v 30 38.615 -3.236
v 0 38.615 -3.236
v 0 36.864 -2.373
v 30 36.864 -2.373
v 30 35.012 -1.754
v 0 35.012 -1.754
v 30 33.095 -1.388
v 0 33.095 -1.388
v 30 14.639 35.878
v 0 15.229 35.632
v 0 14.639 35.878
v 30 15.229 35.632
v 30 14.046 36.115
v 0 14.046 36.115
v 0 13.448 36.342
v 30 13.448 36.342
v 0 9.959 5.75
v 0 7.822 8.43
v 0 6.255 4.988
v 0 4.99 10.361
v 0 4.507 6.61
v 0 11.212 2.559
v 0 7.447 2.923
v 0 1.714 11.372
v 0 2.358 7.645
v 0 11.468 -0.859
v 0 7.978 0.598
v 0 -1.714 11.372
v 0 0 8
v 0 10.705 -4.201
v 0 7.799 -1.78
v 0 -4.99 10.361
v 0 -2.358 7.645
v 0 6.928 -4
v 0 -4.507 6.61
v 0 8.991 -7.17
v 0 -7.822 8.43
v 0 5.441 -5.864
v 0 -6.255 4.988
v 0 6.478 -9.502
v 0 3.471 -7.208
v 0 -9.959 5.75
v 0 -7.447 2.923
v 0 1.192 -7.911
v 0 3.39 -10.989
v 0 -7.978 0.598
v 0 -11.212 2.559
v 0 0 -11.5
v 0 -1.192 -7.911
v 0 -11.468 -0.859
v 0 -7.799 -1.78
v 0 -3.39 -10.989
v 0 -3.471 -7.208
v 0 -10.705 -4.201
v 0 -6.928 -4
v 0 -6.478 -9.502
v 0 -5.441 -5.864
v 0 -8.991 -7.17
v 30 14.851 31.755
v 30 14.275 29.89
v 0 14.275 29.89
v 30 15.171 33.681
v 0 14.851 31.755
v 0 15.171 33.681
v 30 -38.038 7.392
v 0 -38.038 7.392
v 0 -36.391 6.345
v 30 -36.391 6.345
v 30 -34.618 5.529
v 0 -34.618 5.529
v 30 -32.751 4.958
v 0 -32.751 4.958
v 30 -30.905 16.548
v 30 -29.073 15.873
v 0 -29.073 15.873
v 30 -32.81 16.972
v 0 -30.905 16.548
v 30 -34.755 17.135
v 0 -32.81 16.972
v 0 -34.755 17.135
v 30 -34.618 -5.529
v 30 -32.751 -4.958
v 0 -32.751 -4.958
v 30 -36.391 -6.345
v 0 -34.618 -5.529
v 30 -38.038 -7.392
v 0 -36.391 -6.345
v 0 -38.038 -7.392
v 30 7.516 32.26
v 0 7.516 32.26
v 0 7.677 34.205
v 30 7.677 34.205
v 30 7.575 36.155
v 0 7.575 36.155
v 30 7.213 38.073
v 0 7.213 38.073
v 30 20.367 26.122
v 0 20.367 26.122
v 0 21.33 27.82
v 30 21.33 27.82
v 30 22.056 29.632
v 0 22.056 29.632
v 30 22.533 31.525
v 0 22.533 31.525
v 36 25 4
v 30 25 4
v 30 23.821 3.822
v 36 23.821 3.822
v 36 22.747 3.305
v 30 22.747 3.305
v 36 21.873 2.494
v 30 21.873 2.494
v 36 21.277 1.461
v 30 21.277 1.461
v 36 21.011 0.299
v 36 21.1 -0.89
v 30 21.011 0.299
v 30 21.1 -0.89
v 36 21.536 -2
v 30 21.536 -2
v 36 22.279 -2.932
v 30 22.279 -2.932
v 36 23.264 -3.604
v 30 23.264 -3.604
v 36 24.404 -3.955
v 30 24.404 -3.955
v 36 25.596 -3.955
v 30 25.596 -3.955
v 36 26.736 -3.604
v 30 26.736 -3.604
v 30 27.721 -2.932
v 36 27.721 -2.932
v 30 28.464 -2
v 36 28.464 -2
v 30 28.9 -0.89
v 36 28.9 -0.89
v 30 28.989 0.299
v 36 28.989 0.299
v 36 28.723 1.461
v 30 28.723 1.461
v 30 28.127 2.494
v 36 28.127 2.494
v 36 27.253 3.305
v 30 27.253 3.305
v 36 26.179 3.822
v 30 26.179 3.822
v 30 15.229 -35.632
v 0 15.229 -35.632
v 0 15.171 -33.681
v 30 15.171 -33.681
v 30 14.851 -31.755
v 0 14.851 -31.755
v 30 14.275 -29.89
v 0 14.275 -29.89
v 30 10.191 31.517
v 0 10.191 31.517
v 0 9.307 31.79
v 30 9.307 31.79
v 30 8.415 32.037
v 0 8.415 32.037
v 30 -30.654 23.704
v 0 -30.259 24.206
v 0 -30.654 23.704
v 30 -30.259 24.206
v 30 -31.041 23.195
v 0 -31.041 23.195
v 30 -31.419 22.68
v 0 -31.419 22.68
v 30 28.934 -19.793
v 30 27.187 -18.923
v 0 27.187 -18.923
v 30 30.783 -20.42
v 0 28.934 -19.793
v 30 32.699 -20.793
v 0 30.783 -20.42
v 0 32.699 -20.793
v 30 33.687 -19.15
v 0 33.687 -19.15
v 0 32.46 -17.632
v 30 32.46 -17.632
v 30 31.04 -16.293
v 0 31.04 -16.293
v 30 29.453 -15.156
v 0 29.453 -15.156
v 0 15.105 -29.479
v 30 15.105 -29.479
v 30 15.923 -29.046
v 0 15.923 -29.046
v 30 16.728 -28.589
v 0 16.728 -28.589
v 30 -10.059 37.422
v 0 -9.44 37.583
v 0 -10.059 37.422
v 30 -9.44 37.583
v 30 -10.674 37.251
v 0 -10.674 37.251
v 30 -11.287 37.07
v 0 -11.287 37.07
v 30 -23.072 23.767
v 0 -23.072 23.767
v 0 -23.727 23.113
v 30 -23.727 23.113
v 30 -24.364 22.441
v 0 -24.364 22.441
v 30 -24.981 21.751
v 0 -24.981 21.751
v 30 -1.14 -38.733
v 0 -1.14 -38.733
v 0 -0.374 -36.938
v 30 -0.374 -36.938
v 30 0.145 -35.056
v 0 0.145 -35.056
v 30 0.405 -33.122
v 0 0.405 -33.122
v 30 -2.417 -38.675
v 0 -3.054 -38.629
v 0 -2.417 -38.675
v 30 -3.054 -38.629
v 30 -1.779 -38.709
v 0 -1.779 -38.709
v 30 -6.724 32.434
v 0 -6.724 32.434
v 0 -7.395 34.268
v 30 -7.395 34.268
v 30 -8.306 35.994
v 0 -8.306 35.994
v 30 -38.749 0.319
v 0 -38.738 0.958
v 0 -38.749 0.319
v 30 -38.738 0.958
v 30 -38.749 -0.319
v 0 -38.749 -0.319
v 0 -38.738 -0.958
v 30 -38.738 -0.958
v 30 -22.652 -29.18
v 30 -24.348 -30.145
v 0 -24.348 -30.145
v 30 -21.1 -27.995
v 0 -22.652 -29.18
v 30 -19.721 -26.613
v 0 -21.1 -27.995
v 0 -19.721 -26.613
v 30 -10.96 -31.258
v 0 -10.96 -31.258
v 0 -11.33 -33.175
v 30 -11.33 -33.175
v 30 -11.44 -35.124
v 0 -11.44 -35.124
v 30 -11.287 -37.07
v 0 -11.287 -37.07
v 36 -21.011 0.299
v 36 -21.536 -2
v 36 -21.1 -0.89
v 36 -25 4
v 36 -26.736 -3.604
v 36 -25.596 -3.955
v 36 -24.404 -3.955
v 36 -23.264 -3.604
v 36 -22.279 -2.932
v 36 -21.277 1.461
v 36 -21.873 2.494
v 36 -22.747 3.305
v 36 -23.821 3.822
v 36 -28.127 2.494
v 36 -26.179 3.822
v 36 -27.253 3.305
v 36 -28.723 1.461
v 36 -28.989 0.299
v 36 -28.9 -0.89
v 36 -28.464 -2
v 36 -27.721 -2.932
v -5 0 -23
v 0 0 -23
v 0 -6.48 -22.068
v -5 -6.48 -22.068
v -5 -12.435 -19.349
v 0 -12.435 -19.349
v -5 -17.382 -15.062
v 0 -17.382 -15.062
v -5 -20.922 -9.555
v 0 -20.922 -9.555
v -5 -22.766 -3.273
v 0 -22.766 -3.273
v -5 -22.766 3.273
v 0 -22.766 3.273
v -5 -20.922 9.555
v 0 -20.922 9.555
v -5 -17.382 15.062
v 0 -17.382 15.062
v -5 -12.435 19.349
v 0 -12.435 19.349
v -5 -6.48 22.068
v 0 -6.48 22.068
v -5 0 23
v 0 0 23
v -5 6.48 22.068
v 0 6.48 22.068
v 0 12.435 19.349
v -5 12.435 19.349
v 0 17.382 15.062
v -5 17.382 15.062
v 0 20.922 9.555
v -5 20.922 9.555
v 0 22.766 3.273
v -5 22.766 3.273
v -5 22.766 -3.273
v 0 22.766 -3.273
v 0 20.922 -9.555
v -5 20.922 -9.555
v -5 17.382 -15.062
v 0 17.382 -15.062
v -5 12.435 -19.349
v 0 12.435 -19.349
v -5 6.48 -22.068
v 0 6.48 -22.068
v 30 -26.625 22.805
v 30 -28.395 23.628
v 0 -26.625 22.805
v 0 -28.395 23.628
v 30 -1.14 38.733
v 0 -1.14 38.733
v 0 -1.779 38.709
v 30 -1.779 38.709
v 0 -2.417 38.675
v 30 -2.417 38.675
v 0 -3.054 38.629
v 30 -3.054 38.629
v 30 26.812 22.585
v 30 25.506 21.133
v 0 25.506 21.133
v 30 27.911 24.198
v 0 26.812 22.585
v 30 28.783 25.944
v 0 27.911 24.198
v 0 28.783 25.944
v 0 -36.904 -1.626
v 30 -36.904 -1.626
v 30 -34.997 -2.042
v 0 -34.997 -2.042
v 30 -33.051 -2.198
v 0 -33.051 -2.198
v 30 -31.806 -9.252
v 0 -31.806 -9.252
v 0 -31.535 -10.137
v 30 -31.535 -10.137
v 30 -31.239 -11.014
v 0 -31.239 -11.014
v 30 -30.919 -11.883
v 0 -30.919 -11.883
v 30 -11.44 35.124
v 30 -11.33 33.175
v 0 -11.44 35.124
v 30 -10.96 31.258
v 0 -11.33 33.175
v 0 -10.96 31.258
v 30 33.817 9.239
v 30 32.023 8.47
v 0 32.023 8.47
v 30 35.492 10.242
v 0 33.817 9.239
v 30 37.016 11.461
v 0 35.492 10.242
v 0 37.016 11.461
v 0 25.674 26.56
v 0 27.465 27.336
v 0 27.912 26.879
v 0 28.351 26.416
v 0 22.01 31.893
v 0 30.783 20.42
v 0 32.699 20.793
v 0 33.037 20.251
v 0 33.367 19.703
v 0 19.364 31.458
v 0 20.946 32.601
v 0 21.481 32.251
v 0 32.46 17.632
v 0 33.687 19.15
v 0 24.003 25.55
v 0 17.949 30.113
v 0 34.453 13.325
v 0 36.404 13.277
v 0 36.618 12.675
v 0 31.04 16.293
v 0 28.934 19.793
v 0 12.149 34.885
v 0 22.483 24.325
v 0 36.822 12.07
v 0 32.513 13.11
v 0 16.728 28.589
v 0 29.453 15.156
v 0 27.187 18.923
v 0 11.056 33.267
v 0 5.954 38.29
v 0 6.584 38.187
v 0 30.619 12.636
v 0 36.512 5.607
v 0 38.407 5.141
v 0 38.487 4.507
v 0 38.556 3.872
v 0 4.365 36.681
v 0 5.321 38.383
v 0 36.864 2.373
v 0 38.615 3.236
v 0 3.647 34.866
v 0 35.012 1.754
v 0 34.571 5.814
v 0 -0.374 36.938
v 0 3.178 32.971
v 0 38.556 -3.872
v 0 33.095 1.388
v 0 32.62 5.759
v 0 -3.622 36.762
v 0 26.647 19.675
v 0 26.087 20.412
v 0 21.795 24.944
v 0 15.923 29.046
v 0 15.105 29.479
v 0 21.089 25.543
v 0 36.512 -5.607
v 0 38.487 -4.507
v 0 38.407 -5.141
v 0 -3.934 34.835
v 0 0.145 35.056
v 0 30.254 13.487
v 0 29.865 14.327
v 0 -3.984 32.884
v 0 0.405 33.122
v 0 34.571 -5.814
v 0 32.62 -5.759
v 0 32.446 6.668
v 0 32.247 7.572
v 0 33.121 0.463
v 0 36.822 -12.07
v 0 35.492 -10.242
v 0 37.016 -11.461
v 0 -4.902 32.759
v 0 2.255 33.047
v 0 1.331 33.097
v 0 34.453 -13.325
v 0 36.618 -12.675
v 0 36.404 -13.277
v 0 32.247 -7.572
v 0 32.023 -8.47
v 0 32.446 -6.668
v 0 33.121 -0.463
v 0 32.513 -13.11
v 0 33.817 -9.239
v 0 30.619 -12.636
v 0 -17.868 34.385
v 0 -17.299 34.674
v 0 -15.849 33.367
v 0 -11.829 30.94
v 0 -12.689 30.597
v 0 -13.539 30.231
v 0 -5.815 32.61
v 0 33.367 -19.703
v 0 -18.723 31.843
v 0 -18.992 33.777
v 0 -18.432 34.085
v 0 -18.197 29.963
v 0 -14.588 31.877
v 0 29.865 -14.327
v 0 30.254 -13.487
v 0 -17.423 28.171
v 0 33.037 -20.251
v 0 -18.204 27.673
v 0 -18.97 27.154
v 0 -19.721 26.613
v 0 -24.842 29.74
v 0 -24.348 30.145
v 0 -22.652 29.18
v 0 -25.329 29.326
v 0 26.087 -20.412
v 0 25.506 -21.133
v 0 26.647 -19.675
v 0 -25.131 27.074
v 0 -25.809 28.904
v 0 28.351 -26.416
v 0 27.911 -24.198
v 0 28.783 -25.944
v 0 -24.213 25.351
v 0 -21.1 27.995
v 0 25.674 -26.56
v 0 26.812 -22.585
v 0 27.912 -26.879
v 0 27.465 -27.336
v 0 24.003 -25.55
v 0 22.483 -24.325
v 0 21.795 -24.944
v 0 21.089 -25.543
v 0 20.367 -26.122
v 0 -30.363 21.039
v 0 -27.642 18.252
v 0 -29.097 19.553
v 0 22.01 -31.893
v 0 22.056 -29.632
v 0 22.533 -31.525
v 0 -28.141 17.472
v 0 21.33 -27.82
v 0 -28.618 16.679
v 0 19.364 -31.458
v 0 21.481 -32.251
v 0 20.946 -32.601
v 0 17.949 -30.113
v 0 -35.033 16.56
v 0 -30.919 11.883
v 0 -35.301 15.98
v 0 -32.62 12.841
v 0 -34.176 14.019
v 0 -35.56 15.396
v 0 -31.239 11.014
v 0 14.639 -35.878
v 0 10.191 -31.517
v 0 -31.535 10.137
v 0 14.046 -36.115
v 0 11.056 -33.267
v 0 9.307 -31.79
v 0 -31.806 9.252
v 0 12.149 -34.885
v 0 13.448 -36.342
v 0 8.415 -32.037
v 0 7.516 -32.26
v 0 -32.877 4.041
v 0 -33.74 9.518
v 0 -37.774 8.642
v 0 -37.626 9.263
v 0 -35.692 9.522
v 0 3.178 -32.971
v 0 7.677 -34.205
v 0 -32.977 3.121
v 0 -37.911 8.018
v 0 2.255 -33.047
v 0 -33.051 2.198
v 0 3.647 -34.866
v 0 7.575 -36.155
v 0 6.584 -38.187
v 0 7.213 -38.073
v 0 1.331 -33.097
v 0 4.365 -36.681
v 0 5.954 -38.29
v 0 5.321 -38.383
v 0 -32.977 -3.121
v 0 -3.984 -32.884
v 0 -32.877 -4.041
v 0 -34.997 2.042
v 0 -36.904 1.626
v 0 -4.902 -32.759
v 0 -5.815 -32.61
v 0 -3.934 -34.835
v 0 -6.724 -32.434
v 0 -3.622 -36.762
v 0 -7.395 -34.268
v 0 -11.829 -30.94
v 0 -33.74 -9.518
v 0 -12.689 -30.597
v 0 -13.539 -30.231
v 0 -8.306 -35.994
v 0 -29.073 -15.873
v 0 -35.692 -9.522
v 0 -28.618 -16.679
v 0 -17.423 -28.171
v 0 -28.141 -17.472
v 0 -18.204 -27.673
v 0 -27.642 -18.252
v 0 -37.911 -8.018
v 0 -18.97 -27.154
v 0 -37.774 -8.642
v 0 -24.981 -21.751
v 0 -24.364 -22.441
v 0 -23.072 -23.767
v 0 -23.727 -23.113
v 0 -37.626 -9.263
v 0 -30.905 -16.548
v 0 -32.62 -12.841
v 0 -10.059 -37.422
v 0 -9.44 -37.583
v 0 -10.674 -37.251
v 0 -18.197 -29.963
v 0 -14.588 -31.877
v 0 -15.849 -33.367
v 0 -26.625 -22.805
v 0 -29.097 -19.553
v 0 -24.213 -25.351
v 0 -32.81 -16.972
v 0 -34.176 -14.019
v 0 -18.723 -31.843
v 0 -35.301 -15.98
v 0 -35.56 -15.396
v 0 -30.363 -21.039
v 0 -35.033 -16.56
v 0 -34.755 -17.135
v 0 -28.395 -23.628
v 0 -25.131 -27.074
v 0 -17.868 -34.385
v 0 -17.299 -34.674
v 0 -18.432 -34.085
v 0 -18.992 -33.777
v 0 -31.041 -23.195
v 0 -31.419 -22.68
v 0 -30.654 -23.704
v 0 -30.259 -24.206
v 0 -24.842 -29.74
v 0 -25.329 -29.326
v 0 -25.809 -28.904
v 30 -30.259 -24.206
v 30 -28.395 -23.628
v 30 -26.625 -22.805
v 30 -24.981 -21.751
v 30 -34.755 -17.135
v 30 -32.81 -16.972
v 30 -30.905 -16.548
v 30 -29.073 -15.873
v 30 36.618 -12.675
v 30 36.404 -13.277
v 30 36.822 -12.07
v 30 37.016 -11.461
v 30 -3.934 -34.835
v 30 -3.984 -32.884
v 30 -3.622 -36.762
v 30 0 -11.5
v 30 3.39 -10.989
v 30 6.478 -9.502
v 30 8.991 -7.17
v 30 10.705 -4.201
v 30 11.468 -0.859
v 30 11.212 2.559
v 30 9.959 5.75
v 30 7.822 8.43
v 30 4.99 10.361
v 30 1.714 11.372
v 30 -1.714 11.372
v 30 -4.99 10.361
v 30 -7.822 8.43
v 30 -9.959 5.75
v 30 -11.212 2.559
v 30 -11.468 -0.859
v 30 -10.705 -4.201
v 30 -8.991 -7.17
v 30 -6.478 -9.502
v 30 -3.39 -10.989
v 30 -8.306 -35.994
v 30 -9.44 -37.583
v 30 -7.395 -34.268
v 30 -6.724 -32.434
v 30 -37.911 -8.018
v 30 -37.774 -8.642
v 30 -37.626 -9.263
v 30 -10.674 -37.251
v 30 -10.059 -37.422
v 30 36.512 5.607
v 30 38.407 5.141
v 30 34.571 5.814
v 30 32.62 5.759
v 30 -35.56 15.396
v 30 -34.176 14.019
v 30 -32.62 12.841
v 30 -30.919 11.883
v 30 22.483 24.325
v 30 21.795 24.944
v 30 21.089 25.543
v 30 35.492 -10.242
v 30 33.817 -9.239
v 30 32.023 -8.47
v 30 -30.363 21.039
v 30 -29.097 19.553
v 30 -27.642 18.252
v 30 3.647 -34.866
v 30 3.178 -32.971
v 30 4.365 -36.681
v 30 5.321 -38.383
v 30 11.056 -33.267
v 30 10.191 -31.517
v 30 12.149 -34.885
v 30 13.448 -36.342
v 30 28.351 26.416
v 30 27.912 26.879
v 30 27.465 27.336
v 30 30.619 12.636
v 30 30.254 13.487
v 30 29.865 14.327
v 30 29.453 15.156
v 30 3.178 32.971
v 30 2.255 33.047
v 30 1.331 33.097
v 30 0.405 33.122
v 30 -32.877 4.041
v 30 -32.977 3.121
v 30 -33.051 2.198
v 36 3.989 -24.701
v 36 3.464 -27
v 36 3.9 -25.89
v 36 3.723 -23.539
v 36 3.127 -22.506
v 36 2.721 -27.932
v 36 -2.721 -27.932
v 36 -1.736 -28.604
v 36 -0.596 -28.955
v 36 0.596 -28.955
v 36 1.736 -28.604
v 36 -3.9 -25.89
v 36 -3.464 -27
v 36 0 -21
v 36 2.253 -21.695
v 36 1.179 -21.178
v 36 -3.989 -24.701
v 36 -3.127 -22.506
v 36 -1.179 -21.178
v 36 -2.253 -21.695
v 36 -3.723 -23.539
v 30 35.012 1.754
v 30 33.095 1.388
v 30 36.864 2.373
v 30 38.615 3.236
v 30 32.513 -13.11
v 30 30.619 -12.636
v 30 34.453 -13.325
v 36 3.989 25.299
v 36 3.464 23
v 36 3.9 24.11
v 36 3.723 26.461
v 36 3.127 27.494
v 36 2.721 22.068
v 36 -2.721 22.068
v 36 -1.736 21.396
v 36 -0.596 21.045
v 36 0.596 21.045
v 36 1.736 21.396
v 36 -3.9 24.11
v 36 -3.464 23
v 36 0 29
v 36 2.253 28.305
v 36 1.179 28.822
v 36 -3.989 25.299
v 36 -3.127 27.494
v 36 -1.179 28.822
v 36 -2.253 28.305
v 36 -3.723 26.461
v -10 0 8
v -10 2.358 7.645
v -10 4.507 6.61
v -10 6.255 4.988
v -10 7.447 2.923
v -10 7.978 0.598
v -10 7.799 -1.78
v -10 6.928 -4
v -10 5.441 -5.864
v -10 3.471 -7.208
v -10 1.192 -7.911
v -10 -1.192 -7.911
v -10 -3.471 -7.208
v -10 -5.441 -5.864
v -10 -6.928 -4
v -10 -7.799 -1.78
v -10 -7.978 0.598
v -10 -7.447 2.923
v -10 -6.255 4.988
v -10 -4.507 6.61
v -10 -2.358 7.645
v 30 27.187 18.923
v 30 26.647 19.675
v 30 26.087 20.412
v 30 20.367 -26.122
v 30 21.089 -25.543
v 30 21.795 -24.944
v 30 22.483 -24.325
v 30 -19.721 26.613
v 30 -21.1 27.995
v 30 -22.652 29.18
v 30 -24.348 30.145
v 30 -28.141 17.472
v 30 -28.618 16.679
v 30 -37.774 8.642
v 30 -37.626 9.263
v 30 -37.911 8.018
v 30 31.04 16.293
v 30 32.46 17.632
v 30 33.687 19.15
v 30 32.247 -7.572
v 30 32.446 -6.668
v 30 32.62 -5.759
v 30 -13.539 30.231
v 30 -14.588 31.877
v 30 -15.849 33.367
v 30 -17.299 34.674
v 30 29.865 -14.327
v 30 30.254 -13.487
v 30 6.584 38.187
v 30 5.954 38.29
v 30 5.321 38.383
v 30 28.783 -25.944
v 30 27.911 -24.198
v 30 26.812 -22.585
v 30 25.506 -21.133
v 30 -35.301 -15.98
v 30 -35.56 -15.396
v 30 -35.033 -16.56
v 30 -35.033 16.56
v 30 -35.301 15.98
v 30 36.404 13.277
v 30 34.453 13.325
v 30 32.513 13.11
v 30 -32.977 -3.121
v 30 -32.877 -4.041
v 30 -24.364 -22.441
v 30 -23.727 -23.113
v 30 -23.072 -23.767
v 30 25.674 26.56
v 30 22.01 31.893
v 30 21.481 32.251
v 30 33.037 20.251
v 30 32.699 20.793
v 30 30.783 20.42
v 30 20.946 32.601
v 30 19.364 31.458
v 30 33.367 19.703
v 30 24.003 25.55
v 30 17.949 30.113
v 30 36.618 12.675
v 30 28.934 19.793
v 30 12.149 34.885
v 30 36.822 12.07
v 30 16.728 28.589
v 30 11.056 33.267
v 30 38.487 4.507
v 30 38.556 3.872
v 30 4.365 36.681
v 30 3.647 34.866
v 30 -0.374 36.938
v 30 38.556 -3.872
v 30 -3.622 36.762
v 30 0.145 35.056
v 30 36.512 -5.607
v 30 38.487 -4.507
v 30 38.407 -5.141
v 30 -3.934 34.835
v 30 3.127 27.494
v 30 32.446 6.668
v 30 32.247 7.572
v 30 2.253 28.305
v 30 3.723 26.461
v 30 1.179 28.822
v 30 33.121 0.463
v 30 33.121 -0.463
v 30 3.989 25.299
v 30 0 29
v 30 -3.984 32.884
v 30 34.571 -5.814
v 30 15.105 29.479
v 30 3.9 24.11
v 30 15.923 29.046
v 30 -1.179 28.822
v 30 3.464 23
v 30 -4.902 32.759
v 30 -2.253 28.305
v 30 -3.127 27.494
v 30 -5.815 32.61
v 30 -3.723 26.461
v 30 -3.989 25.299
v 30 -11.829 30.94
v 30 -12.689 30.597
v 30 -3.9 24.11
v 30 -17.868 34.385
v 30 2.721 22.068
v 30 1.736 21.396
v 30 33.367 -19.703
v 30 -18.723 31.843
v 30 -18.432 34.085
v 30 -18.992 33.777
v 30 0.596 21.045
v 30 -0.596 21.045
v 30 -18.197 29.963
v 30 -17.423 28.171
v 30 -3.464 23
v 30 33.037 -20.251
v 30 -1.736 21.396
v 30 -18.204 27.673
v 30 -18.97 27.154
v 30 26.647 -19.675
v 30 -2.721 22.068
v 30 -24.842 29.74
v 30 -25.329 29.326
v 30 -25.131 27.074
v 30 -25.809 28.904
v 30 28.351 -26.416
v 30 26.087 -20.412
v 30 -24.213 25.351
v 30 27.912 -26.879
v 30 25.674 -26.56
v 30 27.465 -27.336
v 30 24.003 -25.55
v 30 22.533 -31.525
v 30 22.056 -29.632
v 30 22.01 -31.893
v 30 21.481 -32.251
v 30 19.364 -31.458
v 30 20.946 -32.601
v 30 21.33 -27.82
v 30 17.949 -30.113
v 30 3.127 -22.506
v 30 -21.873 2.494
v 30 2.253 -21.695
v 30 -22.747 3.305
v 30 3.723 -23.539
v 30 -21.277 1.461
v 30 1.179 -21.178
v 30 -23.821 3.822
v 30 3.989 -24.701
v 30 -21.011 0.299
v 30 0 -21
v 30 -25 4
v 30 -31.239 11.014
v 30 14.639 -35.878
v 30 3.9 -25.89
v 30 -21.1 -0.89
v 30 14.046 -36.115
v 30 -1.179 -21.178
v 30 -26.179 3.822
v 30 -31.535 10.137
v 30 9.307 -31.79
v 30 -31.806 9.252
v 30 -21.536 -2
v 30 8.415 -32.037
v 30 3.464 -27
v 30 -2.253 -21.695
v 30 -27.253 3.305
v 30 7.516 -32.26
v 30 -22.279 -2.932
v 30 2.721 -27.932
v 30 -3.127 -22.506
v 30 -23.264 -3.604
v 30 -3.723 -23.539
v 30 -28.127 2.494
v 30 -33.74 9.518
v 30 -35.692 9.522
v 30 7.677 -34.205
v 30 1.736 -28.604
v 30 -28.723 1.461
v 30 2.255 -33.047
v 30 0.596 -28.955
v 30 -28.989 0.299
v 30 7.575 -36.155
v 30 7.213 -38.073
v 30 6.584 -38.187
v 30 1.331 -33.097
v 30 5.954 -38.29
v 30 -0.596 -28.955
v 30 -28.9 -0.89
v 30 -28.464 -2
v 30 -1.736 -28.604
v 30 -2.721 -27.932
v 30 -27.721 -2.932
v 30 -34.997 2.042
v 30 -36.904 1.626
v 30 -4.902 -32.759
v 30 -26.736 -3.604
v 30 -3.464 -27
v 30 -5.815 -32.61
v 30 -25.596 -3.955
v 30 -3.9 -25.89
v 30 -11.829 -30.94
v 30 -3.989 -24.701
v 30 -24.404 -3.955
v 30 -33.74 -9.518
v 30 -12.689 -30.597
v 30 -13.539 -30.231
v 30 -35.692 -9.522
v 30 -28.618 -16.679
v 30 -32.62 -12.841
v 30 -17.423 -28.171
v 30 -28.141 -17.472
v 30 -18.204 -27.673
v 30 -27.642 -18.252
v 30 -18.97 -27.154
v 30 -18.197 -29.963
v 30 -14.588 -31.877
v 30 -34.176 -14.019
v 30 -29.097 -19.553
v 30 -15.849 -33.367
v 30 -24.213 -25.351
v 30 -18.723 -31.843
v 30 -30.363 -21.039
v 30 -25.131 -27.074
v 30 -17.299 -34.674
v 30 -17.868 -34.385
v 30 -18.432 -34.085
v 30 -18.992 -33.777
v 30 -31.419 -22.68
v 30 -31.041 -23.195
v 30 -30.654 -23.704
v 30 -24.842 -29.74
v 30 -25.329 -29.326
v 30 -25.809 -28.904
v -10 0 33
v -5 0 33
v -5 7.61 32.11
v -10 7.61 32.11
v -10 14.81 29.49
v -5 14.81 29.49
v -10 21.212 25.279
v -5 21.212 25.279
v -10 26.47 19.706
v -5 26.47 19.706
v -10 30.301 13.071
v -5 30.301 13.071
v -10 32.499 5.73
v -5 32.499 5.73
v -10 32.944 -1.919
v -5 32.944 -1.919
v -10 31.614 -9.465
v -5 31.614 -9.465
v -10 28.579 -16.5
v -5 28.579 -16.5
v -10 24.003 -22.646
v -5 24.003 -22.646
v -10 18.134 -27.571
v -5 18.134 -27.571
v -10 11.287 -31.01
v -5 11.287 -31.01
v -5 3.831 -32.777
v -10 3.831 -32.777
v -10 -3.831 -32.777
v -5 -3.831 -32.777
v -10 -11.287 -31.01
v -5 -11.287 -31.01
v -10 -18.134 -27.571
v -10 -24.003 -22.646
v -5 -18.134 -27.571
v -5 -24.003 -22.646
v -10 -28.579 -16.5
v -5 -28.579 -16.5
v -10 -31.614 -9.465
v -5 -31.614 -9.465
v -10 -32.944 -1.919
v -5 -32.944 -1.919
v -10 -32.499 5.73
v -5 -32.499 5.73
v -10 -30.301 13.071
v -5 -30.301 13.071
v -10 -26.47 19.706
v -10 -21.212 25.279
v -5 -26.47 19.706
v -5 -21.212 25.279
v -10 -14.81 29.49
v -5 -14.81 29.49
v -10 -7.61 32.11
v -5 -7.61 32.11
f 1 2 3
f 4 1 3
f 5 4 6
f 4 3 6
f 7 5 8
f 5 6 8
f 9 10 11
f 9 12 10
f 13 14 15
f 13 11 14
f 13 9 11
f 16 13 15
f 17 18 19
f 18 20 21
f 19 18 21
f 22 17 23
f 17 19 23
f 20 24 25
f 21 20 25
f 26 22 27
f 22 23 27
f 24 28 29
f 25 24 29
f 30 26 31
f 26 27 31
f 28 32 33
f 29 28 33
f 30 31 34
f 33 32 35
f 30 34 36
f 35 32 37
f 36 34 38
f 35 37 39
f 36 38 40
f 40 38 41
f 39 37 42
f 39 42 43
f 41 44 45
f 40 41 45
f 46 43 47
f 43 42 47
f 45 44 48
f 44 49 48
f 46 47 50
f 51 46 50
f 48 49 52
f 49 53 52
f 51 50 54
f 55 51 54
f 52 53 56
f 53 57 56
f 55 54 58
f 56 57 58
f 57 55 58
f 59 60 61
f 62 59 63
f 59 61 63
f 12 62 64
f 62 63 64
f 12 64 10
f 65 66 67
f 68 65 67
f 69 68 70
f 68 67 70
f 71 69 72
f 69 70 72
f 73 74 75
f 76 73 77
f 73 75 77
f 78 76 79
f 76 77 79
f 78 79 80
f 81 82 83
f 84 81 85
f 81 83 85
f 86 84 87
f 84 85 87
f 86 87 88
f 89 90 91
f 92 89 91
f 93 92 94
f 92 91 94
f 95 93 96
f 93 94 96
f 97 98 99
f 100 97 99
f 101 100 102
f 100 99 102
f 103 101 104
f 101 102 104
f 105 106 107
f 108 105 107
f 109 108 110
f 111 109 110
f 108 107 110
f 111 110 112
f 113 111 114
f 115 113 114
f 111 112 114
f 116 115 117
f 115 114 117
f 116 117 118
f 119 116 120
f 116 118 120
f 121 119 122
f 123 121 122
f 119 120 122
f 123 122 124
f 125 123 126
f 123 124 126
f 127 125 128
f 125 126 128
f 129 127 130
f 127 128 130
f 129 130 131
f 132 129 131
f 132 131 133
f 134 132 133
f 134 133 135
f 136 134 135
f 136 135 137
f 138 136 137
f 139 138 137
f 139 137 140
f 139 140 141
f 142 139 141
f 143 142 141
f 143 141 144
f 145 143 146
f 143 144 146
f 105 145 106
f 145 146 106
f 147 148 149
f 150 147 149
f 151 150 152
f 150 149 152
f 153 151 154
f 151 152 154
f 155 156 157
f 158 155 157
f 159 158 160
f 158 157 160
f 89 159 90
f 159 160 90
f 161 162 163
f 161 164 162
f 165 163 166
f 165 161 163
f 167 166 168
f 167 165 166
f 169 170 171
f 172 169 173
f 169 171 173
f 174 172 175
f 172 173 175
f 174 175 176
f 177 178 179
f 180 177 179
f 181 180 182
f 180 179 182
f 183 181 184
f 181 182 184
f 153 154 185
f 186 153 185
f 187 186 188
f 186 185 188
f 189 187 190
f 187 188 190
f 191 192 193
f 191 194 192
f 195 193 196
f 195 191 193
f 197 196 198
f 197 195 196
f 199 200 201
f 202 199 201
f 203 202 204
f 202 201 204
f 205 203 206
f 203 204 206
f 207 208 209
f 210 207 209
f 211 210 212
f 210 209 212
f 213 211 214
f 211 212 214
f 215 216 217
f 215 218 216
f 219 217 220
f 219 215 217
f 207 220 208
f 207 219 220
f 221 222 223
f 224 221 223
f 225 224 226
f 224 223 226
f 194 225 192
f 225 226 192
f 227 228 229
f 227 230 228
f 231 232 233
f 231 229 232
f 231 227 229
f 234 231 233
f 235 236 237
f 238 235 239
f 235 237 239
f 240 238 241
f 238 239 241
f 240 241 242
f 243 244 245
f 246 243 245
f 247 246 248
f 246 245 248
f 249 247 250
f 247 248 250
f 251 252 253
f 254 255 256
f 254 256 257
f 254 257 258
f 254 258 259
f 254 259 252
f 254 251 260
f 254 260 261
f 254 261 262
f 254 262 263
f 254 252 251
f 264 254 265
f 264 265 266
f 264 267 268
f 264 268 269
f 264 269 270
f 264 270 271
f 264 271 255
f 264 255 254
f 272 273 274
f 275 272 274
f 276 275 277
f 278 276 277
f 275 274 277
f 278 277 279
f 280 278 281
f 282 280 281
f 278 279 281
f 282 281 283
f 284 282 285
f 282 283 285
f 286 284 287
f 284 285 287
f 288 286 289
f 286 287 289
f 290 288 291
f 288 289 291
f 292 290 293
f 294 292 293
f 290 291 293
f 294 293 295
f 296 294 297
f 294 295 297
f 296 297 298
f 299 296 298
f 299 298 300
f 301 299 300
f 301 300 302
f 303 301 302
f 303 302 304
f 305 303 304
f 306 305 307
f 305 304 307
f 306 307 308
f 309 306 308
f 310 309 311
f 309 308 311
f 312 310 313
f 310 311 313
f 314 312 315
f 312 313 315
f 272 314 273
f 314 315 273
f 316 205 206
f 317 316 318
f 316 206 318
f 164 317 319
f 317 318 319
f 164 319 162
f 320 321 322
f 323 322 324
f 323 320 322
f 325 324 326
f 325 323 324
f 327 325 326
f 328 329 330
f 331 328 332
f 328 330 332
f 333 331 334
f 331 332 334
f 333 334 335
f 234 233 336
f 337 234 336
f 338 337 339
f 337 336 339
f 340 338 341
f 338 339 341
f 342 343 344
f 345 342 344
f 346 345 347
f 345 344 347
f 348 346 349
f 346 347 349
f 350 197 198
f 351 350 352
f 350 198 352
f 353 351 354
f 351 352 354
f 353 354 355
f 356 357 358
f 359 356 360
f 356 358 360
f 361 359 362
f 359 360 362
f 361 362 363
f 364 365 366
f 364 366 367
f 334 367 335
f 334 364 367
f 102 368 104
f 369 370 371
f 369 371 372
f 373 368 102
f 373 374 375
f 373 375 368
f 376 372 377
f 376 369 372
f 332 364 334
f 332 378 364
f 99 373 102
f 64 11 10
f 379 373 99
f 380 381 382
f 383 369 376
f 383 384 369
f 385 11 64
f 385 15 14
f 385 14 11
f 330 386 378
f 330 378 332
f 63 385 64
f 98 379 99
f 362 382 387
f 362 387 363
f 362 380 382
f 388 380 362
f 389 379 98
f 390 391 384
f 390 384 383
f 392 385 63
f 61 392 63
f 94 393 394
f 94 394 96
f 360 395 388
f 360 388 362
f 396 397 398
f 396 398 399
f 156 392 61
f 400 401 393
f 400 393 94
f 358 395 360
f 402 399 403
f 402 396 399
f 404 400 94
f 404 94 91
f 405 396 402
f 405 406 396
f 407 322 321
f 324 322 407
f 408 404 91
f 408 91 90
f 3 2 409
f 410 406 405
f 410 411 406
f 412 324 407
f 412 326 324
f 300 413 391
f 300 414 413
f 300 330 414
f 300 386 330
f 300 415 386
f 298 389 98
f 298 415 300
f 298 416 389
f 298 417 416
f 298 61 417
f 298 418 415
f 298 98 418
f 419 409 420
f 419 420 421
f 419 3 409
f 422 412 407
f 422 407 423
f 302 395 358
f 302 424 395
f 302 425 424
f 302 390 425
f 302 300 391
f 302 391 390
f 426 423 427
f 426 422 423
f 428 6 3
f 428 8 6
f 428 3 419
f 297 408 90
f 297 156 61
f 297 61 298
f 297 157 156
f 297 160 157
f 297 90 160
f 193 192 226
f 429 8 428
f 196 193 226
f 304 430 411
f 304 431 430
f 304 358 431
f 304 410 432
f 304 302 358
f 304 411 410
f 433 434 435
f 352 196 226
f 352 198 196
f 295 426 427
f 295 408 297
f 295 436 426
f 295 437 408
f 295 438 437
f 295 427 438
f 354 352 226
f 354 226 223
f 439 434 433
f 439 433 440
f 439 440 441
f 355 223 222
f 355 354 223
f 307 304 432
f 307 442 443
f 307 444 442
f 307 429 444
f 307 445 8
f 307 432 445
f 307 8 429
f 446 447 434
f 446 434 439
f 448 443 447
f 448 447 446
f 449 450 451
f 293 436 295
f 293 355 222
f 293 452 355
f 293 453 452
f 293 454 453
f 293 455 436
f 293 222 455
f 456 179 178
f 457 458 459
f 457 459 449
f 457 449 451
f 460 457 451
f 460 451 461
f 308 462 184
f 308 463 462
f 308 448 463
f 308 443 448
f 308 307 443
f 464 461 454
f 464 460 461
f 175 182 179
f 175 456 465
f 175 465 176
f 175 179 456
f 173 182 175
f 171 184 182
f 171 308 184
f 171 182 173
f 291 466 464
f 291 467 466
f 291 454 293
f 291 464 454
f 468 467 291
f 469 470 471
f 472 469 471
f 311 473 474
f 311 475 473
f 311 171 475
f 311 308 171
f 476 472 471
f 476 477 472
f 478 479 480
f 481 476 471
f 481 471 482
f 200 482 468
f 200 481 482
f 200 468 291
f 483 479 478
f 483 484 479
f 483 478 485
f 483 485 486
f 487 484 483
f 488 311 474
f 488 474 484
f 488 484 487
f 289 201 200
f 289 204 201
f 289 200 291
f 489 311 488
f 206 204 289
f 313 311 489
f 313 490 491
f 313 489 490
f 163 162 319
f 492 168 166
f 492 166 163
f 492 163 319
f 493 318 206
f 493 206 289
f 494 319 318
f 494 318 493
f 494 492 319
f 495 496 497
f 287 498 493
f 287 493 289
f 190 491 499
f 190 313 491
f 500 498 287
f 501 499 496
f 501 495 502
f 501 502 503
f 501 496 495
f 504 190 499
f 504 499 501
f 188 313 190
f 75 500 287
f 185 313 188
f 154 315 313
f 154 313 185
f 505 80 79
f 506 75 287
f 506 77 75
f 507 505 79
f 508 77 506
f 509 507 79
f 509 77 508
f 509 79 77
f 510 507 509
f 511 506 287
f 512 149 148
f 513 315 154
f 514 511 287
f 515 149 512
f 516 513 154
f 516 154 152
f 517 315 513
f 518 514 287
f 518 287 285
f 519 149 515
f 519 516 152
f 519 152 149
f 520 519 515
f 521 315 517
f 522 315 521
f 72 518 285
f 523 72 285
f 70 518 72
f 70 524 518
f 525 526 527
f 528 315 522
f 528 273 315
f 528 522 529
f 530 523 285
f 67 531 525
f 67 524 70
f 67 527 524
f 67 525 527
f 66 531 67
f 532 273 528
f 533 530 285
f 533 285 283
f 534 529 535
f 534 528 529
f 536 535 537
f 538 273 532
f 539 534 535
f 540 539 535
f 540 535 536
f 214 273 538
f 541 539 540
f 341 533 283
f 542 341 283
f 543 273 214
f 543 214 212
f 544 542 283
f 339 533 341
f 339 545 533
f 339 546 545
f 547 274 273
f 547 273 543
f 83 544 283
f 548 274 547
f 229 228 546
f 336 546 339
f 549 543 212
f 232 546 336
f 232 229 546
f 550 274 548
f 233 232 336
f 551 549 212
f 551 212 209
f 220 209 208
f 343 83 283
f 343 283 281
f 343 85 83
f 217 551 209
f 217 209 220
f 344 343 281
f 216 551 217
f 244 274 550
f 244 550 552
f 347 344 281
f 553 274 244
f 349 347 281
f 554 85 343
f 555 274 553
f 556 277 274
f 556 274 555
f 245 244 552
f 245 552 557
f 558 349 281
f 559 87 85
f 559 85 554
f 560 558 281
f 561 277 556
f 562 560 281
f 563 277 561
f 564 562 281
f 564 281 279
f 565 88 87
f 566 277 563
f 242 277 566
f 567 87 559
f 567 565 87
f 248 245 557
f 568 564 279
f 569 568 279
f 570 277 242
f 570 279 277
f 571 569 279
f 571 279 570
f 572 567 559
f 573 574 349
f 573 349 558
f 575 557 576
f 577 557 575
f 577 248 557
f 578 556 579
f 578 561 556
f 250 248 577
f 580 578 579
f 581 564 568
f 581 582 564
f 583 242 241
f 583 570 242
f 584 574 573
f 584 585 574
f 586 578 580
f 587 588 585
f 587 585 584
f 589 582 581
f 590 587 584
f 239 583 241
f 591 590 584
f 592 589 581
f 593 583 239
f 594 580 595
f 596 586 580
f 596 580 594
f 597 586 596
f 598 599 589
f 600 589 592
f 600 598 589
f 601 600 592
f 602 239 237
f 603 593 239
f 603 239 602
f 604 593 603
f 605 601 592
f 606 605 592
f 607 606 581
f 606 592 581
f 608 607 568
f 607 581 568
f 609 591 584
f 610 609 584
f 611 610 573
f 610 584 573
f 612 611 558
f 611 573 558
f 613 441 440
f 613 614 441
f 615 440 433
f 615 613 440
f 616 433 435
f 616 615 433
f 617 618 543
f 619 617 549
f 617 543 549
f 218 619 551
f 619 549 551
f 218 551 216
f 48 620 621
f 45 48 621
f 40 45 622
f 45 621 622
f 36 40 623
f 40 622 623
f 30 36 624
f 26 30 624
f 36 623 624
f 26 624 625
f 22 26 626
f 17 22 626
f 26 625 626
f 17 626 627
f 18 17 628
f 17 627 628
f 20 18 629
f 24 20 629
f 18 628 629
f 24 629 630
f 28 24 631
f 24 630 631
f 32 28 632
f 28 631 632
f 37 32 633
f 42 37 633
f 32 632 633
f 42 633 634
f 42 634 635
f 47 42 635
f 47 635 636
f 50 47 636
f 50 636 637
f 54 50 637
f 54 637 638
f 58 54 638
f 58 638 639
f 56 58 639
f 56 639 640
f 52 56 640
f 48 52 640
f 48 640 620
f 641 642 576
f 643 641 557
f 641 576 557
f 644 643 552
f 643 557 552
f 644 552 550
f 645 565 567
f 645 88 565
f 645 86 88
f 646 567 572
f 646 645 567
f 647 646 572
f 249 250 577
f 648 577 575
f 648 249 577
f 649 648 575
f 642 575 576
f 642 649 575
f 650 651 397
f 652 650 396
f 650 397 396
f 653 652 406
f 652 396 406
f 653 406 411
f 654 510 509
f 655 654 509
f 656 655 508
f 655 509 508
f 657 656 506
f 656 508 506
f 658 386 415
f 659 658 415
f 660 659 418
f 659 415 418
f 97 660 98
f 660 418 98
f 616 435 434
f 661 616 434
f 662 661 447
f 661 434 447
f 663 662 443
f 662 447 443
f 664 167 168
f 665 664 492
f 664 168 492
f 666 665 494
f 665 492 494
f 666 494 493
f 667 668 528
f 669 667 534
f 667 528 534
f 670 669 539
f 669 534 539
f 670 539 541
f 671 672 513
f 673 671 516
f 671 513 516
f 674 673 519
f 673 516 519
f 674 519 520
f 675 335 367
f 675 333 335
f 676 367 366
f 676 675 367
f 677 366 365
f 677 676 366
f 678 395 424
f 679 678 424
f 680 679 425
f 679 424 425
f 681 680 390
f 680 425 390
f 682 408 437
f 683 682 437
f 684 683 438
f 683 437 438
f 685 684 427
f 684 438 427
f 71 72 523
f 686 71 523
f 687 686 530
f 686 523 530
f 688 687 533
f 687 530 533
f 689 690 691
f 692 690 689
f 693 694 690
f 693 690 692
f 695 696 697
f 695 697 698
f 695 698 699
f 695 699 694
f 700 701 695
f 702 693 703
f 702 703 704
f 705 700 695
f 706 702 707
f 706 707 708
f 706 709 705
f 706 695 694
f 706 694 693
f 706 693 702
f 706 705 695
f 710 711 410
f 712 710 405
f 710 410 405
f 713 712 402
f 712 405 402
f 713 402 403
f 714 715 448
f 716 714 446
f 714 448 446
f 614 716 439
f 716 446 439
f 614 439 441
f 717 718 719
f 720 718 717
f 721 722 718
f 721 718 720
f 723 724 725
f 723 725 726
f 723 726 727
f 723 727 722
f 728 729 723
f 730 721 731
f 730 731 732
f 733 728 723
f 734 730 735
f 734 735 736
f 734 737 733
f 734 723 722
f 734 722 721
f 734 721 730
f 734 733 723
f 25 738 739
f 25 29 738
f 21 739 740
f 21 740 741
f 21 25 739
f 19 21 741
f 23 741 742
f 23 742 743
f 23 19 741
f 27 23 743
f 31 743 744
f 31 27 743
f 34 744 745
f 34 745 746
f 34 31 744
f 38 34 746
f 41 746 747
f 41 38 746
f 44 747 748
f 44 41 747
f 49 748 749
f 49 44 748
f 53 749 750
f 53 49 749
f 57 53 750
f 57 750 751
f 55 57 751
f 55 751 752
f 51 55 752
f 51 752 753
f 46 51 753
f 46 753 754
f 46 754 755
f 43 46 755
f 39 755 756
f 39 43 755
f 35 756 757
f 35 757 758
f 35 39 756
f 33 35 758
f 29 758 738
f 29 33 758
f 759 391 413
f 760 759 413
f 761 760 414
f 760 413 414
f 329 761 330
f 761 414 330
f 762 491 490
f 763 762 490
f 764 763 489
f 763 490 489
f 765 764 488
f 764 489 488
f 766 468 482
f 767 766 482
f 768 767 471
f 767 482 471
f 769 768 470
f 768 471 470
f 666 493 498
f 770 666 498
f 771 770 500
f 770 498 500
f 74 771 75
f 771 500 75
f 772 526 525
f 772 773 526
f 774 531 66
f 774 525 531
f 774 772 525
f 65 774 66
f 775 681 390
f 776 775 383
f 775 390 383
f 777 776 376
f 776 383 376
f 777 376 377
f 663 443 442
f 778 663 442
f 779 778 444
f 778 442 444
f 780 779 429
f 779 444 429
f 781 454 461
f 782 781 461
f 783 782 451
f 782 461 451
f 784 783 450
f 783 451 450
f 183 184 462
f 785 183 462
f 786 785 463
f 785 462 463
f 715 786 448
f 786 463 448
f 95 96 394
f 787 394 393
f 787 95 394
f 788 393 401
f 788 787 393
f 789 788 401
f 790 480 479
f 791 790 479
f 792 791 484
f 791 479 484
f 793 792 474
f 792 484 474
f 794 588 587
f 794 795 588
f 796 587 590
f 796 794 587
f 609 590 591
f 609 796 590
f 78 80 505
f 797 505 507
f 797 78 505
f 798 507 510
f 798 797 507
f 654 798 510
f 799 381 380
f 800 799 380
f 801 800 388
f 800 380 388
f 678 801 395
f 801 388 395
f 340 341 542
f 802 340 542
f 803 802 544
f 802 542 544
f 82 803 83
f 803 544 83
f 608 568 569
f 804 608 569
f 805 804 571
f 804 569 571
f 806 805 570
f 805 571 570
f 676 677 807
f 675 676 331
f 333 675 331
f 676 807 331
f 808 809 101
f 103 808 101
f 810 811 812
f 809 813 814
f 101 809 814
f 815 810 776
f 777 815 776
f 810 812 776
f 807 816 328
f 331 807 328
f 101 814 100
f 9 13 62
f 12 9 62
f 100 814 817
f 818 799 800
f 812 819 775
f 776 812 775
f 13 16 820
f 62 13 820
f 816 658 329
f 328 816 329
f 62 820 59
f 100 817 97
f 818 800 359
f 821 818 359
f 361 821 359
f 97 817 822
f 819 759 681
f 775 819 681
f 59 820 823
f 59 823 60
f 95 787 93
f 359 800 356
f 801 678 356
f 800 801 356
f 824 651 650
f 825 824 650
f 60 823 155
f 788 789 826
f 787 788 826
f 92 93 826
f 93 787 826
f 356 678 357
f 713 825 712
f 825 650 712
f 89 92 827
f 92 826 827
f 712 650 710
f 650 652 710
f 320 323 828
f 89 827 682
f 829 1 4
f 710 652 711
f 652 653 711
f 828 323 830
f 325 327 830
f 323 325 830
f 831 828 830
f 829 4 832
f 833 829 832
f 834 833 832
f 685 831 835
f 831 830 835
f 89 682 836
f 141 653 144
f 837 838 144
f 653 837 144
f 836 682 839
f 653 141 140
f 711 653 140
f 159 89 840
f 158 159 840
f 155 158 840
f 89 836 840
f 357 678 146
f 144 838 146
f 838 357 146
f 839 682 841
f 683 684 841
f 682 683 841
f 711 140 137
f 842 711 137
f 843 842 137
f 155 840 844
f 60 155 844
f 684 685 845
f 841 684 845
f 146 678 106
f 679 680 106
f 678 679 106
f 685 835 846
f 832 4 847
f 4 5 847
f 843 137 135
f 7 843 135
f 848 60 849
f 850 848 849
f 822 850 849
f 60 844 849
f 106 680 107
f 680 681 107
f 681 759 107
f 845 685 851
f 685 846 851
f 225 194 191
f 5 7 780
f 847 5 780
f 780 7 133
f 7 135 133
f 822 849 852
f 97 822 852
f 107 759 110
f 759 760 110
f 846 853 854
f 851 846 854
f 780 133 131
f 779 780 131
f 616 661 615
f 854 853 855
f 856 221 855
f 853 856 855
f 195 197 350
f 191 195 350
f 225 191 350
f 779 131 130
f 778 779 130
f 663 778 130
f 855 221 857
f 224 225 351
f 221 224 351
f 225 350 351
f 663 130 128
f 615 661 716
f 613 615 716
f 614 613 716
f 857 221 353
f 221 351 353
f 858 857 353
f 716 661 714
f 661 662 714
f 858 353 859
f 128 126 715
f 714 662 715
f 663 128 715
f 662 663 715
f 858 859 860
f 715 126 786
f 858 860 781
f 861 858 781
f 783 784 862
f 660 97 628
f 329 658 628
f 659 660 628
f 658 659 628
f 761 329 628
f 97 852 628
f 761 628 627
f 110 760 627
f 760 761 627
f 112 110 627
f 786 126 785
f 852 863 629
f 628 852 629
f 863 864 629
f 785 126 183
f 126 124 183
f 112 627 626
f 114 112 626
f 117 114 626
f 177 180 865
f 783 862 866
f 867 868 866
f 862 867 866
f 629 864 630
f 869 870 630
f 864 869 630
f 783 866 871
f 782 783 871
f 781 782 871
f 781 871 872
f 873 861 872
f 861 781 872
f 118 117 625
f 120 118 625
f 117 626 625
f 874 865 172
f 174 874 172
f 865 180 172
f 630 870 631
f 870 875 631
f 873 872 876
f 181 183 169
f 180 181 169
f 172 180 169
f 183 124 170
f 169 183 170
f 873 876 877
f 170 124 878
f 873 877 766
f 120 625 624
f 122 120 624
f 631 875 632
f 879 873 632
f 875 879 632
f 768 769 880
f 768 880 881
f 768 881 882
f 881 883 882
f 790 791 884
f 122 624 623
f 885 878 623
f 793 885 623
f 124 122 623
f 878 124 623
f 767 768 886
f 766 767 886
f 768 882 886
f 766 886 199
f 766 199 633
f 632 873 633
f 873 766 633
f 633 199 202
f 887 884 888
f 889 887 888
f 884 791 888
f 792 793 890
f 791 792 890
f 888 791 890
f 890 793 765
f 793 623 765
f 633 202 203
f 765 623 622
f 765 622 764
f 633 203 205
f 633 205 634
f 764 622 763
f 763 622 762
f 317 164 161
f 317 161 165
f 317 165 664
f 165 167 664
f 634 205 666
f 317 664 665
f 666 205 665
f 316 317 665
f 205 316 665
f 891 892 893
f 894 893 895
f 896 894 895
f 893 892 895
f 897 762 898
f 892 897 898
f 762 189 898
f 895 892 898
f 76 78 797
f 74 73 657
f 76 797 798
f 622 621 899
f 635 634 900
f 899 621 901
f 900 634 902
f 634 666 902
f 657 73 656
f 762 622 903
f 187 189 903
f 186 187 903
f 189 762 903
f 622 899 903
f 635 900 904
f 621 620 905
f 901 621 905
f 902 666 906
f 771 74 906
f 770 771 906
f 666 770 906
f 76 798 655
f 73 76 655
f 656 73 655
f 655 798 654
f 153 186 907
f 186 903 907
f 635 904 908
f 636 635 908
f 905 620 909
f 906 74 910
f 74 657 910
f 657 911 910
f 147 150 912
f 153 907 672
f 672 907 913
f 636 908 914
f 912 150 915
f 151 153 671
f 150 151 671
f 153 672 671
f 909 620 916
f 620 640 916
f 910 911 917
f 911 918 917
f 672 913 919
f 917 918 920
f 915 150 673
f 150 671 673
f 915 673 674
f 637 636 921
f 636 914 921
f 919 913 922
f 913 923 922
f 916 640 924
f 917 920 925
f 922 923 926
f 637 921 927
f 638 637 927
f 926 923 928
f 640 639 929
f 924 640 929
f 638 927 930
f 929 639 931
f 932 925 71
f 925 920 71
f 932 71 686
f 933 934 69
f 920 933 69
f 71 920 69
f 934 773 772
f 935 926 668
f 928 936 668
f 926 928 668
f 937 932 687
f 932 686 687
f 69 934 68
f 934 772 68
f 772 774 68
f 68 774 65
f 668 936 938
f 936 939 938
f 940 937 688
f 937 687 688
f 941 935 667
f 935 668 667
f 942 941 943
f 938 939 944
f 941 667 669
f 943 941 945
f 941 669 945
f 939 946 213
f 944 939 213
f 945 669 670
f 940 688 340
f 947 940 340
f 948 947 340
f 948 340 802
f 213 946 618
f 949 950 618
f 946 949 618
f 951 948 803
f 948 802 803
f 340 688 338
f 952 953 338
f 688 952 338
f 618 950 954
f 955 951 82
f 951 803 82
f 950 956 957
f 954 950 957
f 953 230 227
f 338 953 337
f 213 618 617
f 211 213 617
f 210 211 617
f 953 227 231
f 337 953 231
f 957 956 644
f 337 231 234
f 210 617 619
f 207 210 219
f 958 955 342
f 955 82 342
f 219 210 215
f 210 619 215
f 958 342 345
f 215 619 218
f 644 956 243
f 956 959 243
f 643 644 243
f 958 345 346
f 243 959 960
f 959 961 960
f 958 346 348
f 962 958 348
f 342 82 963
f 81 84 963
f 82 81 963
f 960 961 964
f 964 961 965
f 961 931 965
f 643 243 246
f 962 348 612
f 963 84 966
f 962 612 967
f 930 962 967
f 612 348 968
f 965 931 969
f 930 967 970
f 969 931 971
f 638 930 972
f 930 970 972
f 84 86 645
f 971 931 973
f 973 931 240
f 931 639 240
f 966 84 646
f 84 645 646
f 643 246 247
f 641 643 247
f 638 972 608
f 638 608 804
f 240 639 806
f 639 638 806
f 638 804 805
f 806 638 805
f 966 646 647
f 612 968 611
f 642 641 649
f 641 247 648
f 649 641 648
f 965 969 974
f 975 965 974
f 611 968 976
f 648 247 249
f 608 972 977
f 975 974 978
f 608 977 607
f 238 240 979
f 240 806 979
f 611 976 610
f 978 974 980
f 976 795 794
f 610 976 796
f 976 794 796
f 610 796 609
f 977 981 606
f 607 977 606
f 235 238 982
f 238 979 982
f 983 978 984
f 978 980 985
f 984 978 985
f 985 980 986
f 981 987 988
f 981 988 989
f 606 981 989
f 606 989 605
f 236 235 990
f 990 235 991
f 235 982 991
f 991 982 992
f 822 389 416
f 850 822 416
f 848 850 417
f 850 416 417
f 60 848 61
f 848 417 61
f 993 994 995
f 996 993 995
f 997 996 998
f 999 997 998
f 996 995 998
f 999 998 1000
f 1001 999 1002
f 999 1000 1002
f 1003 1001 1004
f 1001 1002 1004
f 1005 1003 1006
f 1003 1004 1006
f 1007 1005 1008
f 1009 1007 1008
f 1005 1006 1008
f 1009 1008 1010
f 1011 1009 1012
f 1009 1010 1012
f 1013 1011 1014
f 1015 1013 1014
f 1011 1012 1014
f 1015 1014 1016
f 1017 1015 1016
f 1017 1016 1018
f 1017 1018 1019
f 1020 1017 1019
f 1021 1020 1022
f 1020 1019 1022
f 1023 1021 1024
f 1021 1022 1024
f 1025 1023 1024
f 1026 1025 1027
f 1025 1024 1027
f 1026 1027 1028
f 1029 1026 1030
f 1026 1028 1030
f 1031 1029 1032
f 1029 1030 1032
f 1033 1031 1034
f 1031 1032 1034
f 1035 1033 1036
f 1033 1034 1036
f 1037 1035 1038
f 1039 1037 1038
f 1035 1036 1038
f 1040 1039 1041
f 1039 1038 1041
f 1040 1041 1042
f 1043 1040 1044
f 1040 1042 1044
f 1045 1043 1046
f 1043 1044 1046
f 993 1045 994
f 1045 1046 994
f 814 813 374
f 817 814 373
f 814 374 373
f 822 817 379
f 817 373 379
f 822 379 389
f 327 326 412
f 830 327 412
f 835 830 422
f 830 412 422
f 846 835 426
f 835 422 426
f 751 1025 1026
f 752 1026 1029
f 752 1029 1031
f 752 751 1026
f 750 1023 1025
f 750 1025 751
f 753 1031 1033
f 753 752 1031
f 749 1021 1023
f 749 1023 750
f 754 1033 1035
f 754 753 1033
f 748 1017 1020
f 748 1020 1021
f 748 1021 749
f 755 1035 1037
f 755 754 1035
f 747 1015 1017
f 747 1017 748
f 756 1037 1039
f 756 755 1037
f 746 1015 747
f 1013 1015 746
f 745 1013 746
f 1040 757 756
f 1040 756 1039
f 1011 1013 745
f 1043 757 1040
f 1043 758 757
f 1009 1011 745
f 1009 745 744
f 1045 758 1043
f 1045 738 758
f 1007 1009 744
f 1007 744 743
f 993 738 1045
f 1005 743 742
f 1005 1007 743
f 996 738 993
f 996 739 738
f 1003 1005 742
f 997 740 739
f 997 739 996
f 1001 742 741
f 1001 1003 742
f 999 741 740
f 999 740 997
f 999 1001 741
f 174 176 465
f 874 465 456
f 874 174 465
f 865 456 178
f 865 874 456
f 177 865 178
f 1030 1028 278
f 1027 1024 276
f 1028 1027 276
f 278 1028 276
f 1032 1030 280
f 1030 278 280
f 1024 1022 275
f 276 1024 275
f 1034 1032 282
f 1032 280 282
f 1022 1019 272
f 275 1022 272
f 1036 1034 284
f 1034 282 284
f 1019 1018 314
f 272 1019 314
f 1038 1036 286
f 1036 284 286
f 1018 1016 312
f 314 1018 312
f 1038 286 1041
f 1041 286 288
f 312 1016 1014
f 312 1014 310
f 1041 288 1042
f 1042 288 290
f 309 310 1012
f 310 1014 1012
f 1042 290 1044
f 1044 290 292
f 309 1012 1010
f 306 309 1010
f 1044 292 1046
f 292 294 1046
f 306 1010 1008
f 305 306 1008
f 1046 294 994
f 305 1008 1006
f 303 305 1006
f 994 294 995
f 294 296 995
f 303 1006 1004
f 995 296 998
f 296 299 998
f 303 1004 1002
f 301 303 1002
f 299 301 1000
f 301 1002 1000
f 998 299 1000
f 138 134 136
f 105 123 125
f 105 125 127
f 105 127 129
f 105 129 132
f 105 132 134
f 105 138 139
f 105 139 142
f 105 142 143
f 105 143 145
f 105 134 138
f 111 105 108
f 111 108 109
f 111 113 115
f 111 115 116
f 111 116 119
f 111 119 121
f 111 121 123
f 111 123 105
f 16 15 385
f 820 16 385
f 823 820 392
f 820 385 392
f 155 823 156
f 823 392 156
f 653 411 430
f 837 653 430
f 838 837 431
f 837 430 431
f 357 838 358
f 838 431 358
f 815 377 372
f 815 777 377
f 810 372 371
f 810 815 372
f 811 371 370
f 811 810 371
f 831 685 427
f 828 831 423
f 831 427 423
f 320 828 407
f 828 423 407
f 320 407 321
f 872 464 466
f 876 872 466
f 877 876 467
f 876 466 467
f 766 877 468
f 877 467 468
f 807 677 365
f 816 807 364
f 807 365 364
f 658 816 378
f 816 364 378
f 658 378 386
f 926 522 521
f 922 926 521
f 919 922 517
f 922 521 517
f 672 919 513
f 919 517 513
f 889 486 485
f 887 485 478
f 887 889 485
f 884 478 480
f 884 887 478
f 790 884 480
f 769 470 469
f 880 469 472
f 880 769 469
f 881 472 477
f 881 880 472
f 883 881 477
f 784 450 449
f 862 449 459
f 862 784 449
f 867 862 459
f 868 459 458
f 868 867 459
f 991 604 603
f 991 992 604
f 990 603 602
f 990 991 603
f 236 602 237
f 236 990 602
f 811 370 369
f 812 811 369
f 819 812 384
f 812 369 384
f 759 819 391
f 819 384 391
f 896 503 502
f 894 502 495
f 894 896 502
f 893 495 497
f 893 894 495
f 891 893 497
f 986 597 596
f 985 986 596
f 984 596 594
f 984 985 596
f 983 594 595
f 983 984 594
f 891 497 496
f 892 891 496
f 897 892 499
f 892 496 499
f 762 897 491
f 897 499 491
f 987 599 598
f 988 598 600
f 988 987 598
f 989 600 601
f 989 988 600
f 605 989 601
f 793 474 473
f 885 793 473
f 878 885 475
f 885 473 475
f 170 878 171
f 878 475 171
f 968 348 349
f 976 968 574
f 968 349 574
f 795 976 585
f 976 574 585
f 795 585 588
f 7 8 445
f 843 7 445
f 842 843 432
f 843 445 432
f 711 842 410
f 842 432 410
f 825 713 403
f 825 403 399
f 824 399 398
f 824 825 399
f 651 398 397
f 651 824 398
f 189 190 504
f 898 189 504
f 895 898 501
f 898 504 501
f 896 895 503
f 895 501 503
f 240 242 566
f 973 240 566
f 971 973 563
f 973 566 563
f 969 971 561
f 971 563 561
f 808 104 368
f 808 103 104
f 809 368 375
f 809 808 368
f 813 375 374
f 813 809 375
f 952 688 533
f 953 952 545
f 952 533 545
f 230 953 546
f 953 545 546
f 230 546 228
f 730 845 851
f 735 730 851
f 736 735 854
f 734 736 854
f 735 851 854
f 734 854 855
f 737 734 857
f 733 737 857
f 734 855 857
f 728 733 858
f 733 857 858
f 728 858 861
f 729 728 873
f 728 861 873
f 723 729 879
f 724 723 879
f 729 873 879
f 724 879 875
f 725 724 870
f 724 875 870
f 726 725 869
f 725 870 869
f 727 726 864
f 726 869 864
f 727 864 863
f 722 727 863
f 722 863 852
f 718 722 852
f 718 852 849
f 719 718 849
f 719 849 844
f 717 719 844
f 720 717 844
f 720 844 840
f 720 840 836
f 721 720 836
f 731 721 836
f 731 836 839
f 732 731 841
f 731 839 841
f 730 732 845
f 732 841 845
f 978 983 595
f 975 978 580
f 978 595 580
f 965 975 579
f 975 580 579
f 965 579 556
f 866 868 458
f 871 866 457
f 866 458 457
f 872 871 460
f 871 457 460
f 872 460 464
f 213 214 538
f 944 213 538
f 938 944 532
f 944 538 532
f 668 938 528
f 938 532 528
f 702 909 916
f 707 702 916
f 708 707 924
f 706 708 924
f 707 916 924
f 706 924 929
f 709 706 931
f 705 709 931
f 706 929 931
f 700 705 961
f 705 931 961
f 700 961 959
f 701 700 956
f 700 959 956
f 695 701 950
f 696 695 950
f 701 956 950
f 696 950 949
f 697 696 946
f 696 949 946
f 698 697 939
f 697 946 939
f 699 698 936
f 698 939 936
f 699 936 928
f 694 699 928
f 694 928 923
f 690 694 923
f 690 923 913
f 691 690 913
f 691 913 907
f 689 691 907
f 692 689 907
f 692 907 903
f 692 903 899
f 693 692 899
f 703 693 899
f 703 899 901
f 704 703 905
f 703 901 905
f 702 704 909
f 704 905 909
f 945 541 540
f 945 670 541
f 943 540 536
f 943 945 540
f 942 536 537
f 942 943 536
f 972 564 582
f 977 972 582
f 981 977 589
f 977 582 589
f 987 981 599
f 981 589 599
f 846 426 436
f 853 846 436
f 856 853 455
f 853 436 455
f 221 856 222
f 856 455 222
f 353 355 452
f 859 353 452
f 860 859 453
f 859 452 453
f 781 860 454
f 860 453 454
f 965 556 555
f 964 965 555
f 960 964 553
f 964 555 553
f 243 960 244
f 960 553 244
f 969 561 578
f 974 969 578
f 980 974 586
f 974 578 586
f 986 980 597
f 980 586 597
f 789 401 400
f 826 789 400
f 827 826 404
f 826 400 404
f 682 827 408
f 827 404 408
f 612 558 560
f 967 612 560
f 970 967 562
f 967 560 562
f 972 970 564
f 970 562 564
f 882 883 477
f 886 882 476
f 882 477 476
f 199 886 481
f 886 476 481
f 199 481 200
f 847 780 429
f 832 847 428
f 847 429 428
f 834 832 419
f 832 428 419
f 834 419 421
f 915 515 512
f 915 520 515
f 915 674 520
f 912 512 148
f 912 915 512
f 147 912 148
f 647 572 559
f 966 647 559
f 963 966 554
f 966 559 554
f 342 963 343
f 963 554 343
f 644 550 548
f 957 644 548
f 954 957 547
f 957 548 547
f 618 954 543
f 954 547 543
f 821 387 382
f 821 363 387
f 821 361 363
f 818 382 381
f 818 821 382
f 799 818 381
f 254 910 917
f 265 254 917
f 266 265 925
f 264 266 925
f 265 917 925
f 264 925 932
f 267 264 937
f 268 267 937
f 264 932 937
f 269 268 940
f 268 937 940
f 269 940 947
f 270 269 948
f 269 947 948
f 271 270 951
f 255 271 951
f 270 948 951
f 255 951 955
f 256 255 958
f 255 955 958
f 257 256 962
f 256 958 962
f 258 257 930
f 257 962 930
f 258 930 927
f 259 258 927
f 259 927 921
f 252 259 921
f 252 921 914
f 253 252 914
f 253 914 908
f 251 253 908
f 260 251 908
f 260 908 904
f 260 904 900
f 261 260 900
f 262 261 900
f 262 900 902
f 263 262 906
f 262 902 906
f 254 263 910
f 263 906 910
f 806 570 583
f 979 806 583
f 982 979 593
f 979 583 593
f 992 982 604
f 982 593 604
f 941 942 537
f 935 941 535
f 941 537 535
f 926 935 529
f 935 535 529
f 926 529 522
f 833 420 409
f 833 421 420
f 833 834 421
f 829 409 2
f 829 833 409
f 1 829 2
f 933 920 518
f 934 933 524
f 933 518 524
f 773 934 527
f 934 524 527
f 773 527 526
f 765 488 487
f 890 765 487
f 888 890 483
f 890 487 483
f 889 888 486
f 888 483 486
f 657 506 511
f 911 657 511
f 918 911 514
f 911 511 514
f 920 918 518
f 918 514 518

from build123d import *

# Parameters (mm, degrees)
BASPROSKE_W             = 30
BASPROSKE_H             = 38.75
TOOTHCUT_DEPTH          = 63.474994998
TEETHCUTS_COUNT         = 29
TEETHCUTS_ANGLE         = 347.586206897
BORSKE_R                = 6
BORE_DEPTH              = 50.0000508
ESQUISSE1_R             = 4
BOSS_EXTRU_1_DEPTH      = 6
ESQUISSE2_R             = 11.5
ENL_V_MAT_EXTRU_1_DEPTH = 63.46458662
ESQUISSE3_R             = 23
ESQUISSE3_R_2           = 8
BOSS_EXTRU_2_DEPTH      = 5
ESQUISSE4_R             = 33
ESQUISSE4_R_2           = 8
BOSS_EXTRU_3_DEPTH      = 5


with BuildPart() as part:
    # BasProSke → Base-Revolve (revolve)
    with BuildSketch(Plane(origin=(0, 0, 0), x_dir=(1, 0, 0), z_dir=(0, 1, 0)), mode=Mode.PRIVATE) as base_revolve_sk:
        with Locations((15, 19.375)):
            Rectangle(BASPROSKE_W, BASPROSKE_H)
    revolve(base_revolve_sk.sketch.rotate(Axis((-10, 0, 0), (1, 0, 0)), 180), axis=Axis((-10, 0, 0), (1, 0, 0)))

    # TooCutSke → ToothCut (cut, through all)
    with BuildSketch(Plane(origin=(0, 0, 0), x_dir=(0, 0, -1), z_dir=(1, 0, 0))):
        with BuildLine():
            ThreePointArc((1.38827379, 33.094894952), (0, 33.124), (-1.38827379, 33.094894952))
            ThreePointArc((-1.38827379, 33.094894952), (-2.036611336, 35.961759797), (-3.249771531, 38.63897812))
            ThreePointArc((-3.249771531, 38.63897812), (0, 38.7754), (3.249771531, 38.63897812))
            ThreePointArc((3.249771531, 38.63897812), (2.036611336, 35.961759797), (1.38827379, 33.094894952))
        make_face()
    toothcut = extrude(amount=TOOTHCUT_DEPTH, mode=Mode.SUBTRACT)

    # TeethCuts: ToothCut ×29 about axis
    teethcuts_axis = Axis((-10, 0, 0), (1, 0, 0))
    for i in range(1, TEETHCUTS_COUNT):
        add(toothcut.rotate(teethcuts_axis, i * TEETHCUTS_ANGLE / (TEETHCUTS_COUNT - 1)), mode=Mode.SUBTRACT)

    # BorSke → Bore (cut, symmetric)
    with BuildSketch(Plane(origin=(0, 0, 0), x_dir=(0, 0, -1), z_dir=(1, 0, 0))):
        with Locations(Location((0, 0, 0), (0, 0, 180))):
            Circle(BORSKE_R)
    extrude(amount=BORE_DEPTH, both=True, mode=Mode.SUBTRACT)

    # Esquisse1 → Boss.-Extru.1 (add)
    with BuildSketch(Plane(origin=(30, 0, 0), x_dir=(0, 0, -1), z_dir=(1, 0, 0))):
        with Locations(Location((0, 25, 0), (0, 0, 180))):
            Circle(ESQUISSE1_R)
        with Locations(Location((-25, 0, 0), (0, 0, 180))):
            Circle(ESQUISSE1_R)
        with Locations(Location((25, 0, 0), (0, 0, 180))):
            Circle(ESQUISSE1_R)
        with Locations(Location((0, -25, 0), (0, 0, 180))):
            Circle(ESQUISSE1_R)
    extrude(amount=BOSS_EXTRU_1_DEPTH)

    # Esquisse2 → Enlèv. mat.-Extru.1 (cut, through all)
    with BuildSketch(Plane(origin=(30, 0, 0), x_dir=(0, 0, -1), z_dir=(1, 0, 0))):
        Circle(ESQUISSE2_R)
    extrude(amount=-ENL_V_MAT_EXTRU_1_DEPTH, mode=Mode.SUBTRACT)

    # Esquisse3 → Boss.-Extru.2 (add)
    with BuildSketch(Plane.ZY):
        with Locations(Location((0, 0, 0), (0, 0, 180))):
            Circle(ESQUISSE3_R)
        Circle(ESQUISSE3_R_2, mode=Mode.SUBTRACT)
    extrude(amount=BOSS_EXTRU_2_DEPTH)

    # Esquisse4 → Boss.-Extru.3 (add)
    with BuildSketch(Plane.ZY.offset(5)):
        Circle(ESQUISSE4_R)
        Circle(ESQUISSE4_R_2, mode=Mode.SUBTRACT)
    extrude(amount=BOSS_EXTRU_3_DEPTH)


solid = part.part
